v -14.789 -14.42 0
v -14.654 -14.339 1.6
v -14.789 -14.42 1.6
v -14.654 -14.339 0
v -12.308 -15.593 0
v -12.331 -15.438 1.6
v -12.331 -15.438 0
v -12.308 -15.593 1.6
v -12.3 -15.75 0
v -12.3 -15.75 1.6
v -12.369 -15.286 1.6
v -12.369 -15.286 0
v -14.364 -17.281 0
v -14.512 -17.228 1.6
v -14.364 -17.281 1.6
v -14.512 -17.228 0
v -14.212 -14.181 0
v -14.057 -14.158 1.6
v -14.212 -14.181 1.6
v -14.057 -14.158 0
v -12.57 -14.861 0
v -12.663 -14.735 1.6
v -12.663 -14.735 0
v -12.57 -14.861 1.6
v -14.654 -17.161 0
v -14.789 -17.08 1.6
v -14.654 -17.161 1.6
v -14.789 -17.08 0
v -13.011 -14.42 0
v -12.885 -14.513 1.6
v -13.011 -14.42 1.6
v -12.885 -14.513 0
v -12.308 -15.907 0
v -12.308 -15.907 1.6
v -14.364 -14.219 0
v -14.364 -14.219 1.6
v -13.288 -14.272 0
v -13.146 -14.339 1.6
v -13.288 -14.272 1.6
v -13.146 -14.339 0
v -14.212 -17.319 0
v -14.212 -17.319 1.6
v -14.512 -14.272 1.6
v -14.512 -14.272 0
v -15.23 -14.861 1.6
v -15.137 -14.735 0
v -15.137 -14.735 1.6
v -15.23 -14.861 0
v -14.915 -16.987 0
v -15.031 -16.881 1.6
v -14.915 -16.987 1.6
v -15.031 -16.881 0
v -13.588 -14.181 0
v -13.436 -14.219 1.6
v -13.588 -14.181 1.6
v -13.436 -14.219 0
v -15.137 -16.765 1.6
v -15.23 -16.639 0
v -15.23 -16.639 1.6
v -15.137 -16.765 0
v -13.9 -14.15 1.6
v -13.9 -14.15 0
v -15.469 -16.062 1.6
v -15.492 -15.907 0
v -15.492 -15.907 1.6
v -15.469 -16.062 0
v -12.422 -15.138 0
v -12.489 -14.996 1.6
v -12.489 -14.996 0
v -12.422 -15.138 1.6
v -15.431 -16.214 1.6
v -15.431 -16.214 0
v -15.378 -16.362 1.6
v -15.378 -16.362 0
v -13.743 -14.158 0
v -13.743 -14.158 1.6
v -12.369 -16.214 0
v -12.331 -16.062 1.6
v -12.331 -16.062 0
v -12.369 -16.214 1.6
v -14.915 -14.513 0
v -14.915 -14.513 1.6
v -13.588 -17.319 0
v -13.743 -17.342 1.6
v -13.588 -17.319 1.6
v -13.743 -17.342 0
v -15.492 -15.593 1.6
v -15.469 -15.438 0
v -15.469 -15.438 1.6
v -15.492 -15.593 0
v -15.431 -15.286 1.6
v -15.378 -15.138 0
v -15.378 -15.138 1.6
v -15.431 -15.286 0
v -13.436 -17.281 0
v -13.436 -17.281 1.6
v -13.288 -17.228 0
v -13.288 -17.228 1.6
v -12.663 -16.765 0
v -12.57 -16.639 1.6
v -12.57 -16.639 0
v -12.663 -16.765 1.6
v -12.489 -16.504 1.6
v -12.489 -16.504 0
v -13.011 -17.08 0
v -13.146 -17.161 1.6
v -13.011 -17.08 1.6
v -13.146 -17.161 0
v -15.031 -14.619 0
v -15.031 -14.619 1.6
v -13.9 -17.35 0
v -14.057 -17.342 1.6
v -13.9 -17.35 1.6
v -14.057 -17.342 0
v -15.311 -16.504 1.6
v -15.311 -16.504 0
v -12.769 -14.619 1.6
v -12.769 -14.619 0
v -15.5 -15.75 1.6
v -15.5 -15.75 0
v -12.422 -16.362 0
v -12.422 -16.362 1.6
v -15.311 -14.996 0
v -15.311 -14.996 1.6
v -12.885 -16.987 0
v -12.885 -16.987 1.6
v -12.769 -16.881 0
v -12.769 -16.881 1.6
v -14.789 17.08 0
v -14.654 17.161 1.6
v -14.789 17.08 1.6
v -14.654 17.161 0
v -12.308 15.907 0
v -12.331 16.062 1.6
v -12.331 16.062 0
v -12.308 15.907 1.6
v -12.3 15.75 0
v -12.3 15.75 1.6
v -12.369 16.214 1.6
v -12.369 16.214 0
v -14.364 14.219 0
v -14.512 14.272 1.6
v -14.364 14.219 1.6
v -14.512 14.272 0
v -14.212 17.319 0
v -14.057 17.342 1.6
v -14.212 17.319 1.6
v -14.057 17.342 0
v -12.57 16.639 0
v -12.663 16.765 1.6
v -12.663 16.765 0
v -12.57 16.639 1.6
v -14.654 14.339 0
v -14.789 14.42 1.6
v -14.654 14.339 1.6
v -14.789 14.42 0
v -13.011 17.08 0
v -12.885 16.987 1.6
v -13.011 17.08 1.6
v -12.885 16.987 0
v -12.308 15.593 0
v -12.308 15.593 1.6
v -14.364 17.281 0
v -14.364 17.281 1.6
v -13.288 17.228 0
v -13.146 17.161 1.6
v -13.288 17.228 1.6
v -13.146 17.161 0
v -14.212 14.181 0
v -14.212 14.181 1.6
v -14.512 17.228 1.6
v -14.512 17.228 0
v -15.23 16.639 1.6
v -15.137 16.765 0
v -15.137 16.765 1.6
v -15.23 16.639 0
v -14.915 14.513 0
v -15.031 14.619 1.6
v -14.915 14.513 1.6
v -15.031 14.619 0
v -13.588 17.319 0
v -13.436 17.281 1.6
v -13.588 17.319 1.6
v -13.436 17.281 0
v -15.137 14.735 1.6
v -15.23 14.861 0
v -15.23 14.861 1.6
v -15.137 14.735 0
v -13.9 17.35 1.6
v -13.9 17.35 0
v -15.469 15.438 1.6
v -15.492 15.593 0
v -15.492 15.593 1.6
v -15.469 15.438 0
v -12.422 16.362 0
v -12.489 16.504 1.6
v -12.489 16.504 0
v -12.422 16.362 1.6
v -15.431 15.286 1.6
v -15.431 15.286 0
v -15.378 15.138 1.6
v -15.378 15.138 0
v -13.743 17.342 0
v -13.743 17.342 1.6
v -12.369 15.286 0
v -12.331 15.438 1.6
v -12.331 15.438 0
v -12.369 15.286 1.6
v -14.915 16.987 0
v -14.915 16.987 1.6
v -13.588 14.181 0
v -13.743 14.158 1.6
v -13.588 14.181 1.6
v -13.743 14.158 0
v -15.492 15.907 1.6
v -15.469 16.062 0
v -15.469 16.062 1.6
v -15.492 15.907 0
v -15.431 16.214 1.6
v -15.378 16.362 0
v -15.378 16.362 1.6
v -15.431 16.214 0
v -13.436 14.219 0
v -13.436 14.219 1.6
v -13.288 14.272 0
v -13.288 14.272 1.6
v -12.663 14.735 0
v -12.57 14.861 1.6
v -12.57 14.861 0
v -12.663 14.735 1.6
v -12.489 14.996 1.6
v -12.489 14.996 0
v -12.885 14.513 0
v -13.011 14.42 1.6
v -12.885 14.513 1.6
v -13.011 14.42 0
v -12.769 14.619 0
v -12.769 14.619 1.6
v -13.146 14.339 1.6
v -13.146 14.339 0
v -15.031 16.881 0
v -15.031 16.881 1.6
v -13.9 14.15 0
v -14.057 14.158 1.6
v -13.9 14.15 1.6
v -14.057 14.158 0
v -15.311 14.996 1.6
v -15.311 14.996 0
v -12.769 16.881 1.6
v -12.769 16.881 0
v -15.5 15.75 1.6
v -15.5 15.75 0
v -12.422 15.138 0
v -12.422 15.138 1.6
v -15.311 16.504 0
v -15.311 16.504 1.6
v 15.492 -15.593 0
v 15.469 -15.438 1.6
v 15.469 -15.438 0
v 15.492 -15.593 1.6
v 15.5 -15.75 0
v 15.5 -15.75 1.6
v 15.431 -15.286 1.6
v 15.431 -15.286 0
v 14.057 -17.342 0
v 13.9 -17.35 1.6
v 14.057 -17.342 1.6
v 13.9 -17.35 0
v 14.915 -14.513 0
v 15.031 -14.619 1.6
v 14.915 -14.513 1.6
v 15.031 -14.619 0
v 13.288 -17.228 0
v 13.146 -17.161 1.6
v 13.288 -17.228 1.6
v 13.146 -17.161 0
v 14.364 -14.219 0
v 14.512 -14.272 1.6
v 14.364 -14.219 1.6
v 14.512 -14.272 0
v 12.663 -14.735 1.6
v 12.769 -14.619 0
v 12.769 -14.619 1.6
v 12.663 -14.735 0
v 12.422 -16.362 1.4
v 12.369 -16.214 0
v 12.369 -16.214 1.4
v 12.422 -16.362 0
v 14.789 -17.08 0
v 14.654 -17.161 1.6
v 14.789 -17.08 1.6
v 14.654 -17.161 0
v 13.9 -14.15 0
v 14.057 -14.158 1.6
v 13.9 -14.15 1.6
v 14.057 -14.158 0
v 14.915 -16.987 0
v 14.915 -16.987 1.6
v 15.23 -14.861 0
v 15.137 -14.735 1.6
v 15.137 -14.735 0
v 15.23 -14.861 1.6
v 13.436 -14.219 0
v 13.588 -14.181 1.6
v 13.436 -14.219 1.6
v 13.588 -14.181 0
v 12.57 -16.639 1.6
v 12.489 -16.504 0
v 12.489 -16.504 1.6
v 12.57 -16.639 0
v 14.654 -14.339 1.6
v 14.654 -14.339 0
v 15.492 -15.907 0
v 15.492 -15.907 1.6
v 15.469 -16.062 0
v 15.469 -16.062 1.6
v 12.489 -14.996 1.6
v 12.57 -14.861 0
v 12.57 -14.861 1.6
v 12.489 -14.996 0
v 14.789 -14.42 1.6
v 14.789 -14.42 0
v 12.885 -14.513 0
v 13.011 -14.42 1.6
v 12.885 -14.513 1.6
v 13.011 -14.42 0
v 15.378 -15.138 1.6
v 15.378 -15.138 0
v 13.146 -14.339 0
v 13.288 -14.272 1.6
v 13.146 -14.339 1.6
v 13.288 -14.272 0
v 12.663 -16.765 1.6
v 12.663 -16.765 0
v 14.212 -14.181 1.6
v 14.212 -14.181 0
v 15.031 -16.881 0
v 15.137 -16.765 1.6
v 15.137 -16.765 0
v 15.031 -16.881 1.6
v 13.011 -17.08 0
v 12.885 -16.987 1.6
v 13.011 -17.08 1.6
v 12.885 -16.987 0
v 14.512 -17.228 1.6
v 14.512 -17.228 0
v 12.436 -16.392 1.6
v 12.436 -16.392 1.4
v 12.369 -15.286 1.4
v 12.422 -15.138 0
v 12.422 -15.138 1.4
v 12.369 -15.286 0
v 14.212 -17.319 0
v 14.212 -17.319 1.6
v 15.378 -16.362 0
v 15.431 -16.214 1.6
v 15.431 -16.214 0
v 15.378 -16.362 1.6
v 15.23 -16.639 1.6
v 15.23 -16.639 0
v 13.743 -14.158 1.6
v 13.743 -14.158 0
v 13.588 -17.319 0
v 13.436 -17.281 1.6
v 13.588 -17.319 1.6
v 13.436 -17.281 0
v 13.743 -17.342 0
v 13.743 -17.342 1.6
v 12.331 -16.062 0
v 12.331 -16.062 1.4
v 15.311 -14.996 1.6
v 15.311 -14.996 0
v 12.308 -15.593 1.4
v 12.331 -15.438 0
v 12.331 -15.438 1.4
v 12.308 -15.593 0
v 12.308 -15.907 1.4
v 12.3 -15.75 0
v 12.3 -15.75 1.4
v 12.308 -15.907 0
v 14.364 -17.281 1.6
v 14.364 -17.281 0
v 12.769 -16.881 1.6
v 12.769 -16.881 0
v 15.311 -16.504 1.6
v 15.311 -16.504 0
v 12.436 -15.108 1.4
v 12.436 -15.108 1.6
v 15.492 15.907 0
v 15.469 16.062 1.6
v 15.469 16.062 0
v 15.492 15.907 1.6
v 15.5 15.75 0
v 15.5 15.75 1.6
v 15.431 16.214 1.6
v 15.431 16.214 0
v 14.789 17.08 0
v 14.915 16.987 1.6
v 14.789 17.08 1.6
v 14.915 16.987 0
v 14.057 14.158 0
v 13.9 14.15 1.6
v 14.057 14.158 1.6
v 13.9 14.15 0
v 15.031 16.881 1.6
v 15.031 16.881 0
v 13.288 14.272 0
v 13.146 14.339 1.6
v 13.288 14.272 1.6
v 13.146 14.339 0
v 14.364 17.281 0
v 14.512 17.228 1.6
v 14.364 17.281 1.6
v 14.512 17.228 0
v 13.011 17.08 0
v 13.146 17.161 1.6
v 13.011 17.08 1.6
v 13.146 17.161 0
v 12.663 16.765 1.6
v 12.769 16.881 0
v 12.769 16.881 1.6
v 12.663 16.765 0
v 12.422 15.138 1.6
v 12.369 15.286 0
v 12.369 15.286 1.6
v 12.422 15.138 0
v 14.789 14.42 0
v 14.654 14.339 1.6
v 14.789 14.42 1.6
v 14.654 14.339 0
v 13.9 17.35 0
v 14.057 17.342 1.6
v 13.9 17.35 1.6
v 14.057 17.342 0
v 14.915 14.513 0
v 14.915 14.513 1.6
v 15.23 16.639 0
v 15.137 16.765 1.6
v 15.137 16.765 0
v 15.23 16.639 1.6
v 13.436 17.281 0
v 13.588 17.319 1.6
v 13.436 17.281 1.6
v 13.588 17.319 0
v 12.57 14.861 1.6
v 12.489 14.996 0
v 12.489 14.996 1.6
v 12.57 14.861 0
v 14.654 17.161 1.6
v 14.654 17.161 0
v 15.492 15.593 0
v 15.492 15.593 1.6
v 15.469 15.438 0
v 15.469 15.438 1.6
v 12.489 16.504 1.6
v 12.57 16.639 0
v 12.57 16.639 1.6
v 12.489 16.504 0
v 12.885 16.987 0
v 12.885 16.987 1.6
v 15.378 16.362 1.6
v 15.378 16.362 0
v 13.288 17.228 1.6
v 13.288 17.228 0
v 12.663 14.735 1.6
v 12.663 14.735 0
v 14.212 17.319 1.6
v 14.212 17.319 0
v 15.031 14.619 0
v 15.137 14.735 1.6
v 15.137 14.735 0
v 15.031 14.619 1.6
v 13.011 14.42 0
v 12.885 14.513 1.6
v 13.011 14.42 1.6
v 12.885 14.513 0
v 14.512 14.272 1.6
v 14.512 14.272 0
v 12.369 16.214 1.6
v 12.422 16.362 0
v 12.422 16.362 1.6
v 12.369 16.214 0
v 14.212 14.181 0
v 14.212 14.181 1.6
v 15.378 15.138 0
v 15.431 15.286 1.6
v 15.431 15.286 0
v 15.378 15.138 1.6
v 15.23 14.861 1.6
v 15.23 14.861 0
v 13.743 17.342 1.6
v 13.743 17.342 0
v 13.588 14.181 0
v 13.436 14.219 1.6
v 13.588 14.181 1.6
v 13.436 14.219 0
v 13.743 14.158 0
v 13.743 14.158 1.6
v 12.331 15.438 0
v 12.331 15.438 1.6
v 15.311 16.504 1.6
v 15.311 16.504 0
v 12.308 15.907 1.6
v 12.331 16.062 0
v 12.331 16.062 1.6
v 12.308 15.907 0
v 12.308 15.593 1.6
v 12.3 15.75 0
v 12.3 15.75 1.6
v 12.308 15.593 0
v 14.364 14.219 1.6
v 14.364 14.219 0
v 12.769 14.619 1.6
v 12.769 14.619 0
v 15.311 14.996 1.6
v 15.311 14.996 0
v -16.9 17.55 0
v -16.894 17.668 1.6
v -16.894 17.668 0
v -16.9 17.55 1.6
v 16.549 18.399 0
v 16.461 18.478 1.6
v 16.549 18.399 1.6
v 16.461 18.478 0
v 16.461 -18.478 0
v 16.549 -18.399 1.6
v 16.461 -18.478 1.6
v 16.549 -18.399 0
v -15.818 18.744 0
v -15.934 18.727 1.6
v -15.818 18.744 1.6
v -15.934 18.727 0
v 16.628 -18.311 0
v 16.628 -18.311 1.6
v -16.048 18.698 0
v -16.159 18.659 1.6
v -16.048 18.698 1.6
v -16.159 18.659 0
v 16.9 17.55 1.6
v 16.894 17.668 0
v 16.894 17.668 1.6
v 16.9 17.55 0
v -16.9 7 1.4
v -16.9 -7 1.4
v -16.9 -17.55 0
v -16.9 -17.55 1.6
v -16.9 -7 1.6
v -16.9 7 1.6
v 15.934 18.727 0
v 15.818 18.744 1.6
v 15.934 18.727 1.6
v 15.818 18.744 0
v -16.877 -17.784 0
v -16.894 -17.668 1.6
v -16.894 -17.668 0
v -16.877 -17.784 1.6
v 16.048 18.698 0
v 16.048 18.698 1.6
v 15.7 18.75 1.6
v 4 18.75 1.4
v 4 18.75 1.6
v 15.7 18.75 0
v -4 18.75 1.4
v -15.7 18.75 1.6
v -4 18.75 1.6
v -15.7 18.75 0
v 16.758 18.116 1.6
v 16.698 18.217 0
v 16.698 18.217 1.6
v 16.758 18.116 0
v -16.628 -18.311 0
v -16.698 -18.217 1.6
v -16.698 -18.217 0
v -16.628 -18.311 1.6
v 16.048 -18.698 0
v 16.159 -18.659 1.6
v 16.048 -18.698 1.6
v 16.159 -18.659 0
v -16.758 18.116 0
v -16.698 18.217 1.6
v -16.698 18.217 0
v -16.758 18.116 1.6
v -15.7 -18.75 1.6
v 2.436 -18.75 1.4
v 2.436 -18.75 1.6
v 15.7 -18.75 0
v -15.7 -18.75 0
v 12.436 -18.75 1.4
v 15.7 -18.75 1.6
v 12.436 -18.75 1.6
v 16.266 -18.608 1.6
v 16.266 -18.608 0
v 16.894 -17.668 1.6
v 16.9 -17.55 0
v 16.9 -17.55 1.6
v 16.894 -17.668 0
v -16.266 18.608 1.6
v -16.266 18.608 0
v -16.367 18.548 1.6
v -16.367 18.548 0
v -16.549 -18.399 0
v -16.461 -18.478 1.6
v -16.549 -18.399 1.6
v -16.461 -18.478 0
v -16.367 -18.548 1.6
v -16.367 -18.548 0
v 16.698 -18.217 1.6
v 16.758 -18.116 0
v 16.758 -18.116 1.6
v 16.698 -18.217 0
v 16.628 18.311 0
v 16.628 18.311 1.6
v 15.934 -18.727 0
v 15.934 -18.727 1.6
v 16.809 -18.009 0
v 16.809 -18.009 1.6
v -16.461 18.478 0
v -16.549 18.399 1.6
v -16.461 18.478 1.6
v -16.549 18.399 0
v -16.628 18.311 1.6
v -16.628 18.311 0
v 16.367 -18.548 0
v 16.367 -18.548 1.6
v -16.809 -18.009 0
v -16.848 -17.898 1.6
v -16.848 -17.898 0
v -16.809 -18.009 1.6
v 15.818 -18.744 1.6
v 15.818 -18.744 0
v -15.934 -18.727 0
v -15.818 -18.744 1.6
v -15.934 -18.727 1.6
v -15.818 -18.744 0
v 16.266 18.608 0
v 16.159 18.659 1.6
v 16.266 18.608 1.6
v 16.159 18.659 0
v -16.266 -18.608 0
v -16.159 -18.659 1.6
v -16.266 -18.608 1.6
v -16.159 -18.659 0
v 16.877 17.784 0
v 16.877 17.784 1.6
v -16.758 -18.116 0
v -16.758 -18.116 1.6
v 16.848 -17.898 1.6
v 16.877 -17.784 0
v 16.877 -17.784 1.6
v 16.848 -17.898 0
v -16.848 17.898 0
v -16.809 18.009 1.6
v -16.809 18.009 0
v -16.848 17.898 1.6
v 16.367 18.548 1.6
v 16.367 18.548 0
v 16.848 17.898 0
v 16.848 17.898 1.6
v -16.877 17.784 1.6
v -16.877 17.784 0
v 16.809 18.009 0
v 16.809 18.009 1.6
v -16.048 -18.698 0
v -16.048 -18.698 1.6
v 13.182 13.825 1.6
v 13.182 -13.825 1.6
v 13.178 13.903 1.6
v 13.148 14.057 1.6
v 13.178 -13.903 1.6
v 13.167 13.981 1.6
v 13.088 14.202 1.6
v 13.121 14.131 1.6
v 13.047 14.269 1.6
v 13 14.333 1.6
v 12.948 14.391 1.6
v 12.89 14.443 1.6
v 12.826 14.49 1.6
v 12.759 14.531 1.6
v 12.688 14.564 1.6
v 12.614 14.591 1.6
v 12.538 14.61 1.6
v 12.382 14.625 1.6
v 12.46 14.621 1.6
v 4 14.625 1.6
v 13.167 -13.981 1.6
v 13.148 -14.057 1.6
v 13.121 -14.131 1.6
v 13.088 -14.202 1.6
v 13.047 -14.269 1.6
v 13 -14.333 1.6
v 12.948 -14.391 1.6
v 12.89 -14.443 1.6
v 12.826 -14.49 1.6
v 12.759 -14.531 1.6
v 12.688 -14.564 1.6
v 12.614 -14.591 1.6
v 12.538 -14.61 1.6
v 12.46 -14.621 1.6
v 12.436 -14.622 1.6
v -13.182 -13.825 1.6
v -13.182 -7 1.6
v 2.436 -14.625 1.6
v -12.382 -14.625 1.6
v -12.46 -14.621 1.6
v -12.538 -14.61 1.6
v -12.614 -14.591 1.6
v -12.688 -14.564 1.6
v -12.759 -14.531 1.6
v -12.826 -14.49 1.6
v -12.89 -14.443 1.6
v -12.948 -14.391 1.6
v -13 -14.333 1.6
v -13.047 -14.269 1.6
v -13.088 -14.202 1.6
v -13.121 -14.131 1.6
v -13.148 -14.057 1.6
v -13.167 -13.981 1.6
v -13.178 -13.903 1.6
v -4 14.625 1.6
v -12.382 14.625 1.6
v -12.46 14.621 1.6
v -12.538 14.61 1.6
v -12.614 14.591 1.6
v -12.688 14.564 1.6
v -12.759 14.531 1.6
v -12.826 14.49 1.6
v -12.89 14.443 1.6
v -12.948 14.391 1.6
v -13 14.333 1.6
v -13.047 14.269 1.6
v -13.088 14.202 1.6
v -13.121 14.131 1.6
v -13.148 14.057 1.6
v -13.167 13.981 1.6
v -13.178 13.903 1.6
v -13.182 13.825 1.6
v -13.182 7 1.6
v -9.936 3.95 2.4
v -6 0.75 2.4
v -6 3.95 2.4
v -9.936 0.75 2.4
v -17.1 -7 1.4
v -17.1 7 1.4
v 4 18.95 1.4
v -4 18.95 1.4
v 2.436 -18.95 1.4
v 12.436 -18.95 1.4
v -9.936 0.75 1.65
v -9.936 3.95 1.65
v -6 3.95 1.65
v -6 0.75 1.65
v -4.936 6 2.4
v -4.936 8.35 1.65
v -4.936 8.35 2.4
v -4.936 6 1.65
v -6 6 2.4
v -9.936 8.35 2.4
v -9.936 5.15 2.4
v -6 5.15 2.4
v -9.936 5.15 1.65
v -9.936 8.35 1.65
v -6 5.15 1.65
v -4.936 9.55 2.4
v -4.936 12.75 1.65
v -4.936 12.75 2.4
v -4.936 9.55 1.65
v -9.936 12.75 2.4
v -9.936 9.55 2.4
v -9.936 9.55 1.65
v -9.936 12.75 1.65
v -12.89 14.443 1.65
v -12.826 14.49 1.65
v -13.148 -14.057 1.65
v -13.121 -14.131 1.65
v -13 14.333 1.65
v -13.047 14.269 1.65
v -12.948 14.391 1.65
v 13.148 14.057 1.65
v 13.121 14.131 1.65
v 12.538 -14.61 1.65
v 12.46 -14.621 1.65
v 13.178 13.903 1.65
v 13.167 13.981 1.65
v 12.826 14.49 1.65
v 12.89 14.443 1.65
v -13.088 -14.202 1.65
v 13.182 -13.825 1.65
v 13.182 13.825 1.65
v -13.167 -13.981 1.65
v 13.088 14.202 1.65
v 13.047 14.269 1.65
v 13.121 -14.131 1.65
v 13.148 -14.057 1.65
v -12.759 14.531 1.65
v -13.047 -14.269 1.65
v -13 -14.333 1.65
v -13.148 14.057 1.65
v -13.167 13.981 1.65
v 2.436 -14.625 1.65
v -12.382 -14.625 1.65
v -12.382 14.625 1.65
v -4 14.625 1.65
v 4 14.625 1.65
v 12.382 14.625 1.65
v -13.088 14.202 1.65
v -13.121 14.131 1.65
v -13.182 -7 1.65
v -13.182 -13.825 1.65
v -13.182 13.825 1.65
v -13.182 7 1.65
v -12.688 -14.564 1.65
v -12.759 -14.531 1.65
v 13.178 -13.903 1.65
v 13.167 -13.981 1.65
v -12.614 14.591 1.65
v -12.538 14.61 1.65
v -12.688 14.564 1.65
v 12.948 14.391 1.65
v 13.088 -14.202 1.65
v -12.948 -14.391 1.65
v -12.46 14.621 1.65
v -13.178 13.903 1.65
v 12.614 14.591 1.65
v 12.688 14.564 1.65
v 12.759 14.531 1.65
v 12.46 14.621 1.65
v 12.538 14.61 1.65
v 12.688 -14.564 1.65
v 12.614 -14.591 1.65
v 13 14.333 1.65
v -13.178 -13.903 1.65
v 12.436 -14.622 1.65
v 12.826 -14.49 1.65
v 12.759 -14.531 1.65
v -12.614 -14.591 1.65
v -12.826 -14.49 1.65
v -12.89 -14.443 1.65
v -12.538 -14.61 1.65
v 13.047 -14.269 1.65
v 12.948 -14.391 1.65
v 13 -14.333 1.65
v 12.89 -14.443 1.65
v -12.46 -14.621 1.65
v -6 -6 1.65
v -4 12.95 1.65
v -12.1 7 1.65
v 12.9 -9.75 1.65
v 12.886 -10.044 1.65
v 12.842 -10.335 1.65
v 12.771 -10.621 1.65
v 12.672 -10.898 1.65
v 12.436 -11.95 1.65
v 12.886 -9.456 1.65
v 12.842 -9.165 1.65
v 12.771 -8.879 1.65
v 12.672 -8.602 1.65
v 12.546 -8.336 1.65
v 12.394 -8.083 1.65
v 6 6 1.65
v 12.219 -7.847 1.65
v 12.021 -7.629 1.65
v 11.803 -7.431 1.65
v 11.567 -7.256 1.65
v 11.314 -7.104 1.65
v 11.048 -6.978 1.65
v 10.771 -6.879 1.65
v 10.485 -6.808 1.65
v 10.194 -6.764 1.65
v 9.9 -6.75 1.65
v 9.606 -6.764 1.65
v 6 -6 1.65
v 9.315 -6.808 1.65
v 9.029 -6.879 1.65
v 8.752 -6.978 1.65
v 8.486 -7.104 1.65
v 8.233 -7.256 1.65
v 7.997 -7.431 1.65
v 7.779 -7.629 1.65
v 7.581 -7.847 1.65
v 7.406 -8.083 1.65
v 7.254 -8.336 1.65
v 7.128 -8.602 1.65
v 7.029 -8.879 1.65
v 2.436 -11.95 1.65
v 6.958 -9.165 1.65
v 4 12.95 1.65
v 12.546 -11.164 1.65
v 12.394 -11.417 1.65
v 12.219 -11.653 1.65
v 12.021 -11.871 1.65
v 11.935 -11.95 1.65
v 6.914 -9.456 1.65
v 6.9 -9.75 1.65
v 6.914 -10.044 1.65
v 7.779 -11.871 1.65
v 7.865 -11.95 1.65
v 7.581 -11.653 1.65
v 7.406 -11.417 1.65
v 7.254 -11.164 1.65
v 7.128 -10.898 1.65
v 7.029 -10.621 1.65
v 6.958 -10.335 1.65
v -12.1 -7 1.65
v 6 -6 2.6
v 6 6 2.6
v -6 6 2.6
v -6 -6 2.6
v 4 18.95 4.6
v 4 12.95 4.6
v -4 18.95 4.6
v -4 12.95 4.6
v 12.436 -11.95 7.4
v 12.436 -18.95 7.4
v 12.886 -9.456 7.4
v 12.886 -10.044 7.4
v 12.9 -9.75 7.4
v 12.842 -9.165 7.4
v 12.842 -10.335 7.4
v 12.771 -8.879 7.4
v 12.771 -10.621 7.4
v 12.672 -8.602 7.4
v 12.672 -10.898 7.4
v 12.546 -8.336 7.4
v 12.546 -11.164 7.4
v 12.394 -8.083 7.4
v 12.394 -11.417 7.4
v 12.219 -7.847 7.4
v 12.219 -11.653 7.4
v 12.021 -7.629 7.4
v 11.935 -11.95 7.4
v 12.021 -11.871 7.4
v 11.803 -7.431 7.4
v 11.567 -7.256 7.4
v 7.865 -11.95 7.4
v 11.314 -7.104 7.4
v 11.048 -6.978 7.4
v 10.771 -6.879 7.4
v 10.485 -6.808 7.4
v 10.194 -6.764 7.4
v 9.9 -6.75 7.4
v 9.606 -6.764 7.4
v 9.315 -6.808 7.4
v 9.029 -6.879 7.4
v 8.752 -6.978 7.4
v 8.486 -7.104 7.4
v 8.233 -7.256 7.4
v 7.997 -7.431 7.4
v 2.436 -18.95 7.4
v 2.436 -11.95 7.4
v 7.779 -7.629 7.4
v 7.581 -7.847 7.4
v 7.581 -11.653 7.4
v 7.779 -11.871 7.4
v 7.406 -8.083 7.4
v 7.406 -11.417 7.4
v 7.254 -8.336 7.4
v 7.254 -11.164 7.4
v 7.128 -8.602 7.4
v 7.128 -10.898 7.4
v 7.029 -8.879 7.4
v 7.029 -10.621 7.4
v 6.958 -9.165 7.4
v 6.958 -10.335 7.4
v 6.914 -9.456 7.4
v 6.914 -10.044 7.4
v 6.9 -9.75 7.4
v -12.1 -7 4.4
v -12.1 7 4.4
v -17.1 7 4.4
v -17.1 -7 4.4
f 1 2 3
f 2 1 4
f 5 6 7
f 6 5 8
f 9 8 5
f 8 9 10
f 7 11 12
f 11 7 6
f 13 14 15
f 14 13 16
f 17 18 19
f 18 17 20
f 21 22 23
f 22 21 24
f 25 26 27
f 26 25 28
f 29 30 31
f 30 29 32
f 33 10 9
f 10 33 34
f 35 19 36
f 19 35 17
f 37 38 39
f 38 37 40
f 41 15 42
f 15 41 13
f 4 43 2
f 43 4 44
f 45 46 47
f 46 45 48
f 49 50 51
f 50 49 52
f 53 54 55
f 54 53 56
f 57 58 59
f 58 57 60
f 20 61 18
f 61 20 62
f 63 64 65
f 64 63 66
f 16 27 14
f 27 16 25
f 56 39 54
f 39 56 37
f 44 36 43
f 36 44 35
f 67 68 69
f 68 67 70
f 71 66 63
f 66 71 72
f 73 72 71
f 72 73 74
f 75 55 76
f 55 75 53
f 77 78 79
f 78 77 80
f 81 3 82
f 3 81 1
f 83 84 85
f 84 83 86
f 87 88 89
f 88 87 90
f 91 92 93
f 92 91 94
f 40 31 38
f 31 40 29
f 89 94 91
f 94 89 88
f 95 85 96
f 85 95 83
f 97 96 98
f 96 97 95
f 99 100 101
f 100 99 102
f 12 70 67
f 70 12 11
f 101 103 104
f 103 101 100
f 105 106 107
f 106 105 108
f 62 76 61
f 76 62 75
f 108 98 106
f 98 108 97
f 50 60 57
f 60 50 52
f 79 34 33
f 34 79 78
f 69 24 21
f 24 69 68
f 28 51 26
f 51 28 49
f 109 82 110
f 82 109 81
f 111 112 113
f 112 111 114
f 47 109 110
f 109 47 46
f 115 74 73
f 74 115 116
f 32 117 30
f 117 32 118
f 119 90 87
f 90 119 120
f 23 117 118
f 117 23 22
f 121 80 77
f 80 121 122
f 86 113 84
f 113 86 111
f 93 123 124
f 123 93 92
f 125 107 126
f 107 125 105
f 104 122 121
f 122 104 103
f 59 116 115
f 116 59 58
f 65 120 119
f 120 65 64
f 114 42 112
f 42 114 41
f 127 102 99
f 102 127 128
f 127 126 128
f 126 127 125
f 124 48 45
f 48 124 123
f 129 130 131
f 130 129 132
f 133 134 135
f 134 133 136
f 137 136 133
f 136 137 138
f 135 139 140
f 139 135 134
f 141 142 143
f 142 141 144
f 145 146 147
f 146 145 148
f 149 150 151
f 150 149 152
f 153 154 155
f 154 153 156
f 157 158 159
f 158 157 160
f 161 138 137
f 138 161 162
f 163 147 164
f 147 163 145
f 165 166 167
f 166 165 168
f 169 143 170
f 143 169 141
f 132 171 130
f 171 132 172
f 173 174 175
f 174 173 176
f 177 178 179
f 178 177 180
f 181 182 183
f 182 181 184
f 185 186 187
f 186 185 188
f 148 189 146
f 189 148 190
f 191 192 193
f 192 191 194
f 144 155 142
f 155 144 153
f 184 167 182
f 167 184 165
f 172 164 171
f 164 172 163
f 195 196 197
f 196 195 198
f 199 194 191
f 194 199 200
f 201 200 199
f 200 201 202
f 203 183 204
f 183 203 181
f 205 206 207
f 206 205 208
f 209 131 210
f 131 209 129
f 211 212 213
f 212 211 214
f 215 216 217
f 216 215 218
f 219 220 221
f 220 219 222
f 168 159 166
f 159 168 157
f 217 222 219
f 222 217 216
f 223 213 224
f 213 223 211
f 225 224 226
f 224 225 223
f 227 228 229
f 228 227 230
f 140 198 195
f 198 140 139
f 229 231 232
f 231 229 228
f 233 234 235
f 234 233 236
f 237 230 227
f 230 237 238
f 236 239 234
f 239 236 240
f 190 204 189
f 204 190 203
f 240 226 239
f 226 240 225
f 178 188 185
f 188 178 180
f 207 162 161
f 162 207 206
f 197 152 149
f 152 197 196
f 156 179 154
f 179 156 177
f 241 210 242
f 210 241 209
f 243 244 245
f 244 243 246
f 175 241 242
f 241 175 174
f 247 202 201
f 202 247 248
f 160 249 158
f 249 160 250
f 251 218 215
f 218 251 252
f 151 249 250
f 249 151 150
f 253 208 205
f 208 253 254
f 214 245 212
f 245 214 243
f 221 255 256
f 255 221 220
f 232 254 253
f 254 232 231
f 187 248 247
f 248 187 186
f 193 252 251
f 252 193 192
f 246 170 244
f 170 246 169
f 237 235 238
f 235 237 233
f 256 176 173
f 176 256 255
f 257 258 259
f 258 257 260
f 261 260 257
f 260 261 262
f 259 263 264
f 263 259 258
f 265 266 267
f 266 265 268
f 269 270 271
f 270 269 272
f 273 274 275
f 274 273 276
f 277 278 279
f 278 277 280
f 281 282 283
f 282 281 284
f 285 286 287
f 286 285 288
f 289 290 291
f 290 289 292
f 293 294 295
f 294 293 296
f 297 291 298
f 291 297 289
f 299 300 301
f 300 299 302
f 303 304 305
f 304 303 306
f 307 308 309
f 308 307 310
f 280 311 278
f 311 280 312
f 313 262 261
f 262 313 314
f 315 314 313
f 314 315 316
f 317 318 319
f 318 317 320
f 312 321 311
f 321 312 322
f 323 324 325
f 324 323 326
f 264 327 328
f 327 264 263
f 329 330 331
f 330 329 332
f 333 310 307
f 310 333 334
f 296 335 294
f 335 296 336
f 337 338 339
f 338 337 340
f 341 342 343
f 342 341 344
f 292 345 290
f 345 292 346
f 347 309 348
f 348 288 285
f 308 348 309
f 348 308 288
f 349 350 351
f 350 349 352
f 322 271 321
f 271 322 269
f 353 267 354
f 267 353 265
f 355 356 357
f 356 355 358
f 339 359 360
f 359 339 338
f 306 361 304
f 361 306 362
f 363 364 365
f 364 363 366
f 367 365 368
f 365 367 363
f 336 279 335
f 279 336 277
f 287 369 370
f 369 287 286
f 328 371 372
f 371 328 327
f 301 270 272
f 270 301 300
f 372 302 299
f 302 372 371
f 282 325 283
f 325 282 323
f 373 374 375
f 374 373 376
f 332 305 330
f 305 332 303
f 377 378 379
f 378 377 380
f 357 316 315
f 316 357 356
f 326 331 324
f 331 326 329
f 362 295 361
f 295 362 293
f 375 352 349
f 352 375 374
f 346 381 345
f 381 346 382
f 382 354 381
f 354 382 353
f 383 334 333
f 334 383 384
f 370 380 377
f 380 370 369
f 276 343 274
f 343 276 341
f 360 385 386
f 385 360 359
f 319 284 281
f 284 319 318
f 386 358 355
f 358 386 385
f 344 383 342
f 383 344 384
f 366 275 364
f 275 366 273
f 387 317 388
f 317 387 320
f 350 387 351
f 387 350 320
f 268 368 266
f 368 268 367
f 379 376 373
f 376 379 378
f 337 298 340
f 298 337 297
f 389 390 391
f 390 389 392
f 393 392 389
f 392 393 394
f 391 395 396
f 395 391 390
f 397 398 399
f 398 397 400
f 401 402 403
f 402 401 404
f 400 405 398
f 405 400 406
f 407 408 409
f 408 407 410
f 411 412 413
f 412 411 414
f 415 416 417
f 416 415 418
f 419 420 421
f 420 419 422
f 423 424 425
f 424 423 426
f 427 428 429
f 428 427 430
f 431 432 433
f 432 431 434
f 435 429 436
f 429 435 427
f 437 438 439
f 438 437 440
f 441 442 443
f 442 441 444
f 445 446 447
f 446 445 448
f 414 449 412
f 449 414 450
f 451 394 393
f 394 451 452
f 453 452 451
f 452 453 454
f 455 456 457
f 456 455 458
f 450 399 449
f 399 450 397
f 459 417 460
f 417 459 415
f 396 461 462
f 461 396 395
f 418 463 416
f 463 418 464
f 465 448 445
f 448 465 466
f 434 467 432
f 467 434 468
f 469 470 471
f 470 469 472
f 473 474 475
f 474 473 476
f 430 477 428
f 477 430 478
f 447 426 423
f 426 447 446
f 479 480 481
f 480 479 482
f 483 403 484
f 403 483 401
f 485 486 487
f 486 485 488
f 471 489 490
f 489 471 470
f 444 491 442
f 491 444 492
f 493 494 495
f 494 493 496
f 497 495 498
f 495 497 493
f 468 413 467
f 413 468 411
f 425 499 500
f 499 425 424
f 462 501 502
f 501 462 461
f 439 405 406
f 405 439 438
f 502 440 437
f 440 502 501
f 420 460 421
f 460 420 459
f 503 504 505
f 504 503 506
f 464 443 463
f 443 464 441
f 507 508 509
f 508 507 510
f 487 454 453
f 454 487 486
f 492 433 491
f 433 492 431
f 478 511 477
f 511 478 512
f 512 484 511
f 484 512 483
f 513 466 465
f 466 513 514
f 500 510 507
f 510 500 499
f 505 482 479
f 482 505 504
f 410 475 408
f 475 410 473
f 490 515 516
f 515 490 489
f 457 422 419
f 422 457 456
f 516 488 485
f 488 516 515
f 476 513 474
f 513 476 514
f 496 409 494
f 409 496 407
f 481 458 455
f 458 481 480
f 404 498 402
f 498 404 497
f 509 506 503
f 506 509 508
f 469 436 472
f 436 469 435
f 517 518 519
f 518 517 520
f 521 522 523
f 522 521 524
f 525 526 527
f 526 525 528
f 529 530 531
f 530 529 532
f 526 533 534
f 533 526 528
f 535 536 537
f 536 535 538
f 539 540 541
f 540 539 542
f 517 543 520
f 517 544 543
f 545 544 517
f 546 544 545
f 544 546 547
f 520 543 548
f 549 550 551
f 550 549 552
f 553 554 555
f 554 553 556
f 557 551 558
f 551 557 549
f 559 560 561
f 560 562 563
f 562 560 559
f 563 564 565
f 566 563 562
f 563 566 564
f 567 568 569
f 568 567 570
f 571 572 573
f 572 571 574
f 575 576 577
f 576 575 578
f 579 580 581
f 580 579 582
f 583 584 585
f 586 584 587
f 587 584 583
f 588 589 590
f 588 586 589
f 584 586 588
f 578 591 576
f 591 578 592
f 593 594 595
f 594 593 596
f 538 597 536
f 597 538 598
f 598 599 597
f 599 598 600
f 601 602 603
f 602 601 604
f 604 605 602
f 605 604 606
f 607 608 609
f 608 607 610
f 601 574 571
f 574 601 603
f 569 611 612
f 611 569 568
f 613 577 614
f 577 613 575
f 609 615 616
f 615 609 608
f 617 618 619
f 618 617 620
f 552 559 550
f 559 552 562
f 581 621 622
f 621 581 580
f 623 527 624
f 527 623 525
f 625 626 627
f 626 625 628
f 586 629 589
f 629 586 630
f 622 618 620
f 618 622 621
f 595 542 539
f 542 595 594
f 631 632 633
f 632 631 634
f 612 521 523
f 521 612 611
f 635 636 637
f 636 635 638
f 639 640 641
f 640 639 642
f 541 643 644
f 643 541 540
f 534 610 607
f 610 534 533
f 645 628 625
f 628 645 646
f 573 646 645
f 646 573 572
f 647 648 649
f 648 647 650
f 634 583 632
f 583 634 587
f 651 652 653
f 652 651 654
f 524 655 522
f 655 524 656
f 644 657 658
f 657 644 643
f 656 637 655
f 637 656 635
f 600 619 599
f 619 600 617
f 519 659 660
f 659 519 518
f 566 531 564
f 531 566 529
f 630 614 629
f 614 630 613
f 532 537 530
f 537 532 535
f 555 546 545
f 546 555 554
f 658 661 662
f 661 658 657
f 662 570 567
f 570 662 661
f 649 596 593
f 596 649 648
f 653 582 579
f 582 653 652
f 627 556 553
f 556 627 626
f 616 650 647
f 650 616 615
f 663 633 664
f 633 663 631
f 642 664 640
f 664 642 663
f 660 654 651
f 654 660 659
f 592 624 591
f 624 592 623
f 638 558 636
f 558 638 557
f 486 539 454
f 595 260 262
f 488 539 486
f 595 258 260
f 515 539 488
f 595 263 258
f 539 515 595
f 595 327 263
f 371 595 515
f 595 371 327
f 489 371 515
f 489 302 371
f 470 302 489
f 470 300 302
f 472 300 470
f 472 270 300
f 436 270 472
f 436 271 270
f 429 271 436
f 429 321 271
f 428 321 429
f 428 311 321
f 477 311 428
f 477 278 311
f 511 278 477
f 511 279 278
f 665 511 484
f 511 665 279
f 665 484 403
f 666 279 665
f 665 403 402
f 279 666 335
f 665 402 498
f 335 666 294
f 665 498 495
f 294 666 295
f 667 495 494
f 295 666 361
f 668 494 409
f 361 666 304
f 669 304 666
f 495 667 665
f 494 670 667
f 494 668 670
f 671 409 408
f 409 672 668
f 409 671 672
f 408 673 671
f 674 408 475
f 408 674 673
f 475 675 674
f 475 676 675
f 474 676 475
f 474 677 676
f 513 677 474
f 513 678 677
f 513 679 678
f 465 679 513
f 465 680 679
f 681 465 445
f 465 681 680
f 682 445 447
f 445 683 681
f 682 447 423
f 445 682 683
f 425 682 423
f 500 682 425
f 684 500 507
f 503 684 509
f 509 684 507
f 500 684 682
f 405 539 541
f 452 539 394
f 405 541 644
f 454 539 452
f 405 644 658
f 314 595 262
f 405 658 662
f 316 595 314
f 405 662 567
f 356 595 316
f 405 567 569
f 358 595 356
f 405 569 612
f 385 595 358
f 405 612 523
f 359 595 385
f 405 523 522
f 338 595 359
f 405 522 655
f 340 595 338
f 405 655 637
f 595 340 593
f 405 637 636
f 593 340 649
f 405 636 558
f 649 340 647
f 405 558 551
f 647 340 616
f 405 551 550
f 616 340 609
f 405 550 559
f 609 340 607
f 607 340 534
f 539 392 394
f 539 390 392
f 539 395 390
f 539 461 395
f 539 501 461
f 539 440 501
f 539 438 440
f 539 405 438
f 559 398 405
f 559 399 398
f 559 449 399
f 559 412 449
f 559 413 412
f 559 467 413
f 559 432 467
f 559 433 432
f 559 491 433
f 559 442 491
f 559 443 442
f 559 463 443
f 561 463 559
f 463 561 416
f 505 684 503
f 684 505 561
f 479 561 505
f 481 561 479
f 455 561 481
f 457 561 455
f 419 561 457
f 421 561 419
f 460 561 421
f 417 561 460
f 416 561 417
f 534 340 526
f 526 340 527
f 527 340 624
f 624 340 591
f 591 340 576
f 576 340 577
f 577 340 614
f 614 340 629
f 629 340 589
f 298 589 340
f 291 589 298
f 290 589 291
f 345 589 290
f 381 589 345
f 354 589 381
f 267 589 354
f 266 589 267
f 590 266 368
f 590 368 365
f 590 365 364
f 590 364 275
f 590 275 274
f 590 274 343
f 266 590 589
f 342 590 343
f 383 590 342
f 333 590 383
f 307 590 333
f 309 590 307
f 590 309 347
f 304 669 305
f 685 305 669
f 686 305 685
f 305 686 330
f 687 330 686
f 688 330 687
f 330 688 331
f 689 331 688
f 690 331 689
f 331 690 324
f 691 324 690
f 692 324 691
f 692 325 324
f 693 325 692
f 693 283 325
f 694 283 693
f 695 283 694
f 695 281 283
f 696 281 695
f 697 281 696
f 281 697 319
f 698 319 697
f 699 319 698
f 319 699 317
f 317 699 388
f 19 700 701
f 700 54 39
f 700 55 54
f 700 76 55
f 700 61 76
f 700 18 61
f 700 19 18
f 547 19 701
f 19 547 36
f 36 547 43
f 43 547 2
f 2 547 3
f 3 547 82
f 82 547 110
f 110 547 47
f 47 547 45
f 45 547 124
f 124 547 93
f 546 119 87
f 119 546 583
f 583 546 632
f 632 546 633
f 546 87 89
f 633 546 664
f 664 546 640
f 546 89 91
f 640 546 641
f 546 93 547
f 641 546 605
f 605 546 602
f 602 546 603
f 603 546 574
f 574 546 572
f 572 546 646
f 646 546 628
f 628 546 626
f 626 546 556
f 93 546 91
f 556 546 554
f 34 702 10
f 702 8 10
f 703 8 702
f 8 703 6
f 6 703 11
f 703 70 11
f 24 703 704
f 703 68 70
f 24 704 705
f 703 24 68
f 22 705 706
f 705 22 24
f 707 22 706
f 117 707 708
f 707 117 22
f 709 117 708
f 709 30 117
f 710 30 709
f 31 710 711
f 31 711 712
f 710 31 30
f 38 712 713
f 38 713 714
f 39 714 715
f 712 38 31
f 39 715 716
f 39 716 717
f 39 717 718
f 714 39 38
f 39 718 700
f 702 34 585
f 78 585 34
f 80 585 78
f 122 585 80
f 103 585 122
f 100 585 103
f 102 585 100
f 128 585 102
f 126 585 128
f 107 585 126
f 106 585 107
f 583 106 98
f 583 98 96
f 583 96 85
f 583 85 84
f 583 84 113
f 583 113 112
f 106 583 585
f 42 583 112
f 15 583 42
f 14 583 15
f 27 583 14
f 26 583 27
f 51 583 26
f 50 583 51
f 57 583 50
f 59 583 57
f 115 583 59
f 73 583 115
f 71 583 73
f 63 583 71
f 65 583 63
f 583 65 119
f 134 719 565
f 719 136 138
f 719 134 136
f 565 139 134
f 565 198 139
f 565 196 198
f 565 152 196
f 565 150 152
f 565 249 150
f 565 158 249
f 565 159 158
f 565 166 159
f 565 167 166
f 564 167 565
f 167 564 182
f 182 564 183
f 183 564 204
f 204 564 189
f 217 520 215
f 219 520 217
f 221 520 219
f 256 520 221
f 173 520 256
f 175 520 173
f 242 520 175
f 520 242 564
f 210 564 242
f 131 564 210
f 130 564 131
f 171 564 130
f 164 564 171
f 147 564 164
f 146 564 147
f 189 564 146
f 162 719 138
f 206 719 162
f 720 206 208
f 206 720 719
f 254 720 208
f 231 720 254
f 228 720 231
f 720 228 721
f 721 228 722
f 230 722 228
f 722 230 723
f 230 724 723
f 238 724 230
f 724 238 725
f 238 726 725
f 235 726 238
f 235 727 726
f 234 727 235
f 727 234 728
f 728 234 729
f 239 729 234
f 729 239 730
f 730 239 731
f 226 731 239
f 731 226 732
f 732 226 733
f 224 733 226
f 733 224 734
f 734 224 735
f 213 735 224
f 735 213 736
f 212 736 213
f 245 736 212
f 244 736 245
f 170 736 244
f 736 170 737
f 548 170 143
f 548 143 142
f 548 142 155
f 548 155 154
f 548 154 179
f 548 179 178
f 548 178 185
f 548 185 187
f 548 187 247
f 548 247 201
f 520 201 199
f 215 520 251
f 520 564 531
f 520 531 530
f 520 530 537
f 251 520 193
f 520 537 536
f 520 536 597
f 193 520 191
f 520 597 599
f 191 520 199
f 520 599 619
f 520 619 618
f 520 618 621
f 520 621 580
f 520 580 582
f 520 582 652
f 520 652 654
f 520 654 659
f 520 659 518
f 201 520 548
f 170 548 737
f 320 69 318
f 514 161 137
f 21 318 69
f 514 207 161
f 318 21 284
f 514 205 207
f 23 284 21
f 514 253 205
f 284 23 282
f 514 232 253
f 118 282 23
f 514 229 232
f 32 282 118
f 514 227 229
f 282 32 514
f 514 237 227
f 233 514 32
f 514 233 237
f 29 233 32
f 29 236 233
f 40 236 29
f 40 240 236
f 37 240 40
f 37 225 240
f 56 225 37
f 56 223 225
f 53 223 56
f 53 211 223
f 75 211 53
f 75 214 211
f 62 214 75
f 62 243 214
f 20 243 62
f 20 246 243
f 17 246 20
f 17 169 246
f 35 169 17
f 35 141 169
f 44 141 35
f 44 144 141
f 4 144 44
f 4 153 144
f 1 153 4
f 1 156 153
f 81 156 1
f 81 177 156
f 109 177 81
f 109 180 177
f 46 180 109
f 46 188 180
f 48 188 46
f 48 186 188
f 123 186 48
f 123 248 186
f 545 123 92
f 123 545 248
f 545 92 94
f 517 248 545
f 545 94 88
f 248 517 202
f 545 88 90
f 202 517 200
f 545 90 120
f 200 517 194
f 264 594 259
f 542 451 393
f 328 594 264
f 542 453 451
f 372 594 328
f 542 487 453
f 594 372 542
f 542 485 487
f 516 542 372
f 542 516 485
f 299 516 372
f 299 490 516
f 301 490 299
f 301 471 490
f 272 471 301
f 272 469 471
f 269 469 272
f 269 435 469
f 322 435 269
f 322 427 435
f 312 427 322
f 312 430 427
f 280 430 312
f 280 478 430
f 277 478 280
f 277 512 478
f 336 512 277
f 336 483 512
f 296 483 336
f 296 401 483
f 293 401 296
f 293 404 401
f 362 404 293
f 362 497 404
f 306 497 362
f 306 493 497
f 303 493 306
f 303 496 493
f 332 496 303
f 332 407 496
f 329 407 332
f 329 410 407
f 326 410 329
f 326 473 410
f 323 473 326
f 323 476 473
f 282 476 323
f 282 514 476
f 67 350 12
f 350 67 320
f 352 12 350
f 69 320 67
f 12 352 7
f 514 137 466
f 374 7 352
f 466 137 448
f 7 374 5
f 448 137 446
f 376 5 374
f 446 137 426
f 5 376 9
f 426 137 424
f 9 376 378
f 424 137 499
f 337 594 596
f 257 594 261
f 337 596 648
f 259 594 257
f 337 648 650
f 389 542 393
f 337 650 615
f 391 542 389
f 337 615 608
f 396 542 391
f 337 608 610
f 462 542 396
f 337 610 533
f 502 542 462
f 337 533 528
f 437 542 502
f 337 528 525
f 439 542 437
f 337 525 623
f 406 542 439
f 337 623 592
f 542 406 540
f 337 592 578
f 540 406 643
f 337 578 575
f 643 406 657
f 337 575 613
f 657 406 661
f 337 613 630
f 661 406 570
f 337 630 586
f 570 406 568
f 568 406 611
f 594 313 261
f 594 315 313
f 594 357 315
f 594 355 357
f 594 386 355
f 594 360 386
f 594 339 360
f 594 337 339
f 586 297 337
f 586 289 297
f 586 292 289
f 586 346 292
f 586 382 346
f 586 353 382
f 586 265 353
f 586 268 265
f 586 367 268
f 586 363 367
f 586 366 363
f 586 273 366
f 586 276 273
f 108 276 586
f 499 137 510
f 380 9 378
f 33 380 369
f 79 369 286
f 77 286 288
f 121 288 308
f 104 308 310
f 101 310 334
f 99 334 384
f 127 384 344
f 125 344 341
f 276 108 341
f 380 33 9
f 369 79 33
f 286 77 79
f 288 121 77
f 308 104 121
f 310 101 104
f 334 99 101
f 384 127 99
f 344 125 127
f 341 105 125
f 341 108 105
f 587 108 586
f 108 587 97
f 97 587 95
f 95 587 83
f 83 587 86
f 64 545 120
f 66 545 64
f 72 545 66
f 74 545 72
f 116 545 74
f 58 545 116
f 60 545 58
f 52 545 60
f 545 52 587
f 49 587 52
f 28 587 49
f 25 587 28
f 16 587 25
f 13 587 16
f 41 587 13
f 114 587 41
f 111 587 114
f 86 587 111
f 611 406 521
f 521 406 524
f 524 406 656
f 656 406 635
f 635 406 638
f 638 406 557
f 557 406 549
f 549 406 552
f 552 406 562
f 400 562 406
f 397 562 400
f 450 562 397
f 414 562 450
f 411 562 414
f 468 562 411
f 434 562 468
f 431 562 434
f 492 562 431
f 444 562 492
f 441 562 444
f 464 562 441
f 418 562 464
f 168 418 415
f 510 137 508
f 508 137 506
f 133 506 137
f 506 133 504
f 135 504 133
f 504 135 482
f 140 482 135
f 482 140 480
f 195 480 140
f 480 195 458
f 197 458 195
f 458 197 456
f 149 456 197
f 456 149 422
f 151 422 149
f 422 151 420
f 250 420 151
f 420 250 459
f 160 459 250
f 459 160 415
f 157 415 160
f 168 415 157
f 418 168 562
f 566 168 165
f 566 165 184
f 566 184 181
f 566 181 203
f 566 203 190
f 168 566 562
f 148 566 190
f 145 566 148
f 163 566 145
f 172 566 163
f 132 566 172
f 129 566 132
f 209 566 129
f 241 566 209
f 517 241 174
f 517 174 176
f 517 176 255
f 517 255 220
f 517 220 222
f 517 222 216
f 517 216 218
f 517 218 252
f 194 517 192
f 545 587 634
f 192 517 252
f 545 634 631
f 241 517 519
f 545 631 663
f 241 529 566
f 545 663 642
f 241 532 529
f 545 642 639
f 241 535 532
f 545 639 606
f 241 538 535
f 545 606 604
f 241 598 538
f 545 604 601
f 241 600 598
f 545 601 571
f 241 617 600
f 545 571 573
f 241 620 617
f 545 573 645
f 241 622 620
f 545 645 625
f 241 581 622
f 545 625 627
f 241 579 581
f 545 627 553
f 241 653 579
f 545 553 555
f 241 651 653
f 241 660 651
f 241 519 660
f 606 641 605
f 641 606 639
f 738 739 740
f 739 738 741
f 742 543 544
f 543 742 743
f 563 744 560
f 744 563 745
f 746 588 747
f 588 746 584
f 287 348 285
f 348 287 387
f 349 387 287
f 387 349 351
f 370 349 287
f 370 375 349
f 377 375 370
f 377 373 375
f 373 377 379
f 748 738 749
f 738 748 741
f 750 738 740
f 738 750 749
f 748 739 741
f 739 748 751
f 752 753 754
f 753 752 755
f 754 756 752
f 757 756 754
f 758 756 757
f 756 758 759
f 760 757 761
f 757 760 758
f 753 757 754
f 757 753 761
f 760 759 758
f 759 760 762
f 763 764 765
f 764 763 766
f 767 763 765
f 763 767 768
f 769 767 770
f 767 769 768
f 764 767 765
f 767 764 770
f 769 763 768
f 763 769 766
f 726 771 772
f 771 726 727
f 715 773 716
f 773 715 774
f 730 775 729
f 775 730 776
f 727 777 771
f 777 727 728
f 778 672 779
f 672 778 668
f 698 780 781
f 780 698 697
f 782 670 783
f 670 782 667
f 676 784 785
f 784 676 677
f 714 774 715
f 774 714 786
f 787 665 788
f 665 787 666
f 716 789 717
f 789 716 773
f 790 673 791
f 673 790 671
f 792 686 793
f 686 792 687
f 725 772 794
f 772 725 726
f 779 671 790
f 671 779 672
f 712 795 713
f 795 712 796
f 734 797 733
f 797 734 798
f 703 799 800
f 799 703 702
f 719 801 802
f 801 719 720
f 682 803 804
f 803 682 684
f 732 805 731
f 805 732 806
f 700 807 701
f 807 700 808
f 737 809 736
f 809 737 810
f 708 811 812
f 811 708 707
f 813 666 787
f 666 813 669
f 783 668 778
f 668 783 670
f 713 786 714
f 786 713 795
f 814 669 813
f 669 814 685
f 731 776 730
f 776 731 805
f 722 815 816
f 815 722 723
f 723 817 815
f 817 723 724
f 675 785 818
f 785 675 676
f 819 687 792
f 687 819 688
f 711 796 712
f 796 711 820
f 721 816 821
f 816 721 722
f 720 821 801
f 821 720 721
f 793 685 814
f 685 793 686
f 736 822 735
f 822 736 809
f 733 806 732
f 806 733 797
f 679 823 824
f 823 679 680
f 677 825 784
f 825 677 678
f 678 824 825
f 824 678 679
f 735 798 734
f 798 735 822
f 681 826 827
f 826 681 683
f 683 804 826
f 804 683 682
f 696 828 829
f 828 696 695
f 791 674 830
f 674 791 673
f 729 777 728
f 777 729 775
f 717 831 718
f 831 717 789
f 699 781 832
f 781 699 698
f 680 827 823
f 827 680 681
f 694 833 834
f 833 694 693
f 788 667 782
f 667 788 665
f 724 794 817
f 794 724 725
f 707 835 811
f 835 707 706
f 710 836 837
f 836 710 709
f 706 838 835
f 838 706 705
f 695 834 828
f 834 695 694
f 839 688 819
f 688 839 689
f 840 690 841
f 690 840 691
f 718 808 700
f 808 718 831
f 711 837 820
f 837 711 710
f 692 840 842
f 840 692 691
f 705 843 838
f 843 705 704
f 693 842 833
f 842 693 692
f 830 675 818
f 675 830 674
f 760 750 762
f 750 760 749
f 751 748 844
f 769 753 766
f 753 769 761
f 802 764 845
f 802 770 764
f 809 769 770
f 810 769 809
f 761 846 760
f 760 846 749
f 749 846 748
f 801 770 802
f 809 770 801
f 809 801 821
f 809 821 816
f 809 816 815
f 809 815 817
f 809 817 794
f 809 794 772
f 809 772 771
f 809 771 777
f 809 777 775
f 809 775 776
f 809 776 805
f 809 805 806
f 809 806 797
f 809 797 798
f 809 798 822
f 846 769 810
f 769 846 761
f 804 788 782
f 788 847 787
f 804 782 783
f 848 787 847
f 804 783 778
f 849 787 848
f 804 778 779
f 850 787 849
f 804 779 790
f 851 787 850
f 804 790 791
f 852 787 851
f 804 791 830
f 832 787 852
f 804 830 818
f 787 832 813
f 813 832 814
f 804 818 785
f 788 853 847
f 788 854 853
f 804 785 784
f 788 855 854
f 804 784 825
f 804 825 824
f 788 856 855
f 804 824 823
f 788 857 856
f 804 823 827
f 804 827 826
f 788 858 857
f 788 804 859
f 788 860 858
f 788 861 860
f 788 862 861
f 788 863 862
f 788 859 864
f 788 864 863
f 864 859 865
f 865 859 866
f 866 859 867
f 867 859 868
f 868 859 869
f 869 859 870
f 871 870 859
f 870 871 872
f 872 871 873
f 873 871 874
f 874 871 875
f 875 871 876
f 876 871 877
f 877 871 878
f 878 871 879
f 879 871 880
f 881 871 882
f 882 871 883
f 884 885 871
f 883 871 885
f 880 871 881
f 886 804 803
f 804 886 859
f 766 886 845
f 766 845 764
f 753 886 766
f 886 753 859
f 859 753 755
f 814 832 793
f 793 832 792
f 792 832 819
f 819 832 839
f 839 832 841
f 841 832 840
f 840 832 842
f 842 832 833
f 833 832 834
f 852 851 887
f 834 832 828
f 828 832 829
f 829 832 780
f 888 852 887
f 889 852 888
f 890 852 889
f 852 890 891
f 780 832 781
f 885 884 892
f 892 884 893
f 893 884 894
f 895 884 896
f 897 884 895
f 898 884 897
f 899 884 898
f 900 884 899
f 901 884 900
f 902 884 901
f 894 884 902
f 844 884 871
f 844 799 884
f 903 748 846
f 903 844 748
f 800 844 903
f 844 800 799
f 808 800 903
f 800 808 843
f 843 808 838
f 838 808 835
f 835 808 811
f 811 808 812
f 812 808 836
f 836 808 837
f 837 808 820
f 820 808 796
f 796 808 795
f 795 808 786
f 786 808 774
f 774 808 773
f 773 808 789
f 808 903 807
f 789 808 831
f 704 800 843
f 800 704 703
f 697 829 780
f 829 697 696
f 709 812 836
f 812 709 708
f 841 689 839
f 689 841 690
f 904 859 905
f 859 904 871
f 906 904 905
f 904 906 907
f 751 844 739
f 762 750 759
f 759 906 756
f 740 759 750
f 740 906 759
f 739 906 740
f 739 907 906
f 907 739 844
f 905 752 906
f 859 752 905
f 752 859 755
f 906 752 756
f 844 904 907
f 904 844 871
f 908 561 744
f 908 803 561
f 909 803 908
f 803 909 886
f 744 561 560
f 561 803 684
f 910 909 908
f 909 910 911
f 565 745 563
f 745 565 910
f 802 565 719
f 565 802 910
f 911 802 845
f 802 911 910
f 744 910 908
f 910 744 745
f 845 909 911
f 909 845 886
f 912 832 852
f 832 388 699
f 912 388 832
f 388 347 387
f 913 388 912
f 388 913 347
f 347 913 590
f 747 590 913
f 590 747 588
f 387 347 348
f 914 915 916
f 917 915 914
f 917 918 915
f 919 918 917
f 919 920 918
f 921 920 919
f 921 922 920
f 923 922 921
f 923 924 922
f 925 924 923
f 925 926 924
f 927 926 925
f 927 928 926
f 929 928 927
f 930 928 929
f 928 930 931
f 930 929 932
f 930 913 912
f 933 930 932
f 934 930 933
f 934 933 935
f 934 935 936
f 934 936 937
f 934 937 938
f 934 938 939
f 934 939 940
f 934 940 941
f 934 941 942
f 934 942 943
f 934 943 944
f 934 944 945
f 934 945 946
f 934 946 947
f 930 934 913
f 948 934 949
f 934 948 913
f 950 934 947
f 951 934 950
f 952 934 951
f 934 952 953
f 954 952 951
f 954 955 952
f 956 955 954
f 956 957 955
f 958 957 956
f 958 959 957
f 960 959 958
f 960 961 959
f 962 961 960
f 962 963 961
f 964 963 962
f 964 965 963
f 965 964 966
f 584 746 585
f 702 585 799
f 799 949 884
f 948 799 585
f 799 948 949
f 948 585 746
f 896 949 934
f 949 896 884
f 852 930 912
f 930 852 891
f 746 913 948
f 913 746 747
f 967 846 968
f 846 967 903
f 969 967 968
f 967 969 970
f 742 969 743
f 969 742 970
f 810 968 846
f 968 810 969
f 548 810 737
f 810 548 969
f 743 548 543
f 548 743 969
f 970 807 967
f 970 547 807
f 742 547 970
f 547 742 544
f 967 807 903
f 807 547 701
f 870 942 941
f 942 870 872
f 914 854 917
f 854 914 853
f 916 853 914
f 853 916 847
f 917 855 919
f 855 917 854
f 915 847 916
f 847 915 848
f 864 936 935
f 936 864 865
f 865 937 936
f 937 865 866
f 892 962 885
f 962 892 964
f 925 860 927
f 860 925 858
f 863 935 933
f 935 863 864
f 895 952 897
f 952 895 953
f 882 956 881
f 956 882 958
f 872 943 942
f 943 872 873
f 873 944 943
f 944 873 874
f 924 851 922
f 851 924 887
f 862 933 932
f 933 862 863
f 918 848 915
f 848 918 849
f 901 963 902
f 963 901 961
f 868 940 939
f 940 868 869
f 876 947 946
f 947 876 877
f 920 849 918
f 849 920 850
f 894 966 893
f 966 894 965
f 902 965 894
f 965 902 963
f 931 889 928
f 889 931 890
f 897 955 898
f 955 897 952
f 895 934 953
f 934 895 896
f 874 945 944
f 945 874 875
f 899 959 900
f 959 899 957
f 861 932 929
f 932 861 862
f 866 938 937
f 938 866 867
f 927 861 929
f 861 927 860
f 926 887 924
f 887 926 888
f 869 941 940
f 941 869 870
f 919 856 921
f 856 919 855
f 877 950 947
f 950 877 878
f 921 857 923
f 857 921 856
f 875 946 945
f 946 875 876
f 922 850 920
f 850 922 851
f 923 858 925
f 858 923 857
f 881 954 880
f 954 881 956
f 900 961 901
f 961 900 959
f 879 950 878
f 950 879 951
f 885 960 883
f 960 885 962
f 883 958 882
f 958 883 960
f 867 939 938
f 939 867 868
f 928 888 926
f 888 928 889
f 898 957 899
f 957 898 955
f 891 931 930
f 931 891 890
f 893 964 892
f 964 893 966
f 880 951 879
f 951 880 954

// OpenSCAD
$fn = 64;

// Control board overall size (verified by parameters)
board_x  = 33.8;
board_y  = 37.5;
board_th = 1.6;

// Small overlap to guarantee watertight unions
eps = 0.2;

// ---------- Feature parameters (generic control-board look) ----------
corner_r = 1.2;

// Mounting holes (typical 3mm clearance) and offsets from edges
hole_d = 3.2;
hole_edge_x = 3.0;
hole_edge_y = 3.0;

// Components (kept within board outline and connected)
soldermask_bump = 0.25;   // subtle raised "silkscreen/soldermask" areas
ic_h   = 1.2;
ic_x   = 12.0;
ic_y   = 12.0;

usb_w  = 8.0;
usb_d  = 6.0;
usb_h  = 3.2;

term_w = 10.0;
term_d = 7.0;
term_h = 6.0;

pin_w  = 14.0;
pin_d  = 5.0;
pin_h  = 3.0;

cap_r  = 3.0;
cap_h  = 6.0;

// ---------- Helpers ----------
module rounded_rect_prism(x, y, z, r) {
    // Rounded rectangle via hull of corner cylinders
    hull() {
        for (sx = [-1, 1], sy = [-1, 1])
            translate([sx*(x/2 - r), sy*(y/2 - r), 0])
                cylinder(r=r, h=z, center=true);
    }
}

module mount_holes() {
    for (sx = [-1, 1], sy = [-1, 1])
        translate([sx*(board_x/2 - hole_edge_x), sy*(board_y/2 - hole_edge_y), 0])
            cylinder(d=hole_d, h=board_th + 2, center=true);
}

// ---------- Model (ONE connected solid) ----------
union() {
    // PCB with mounting holes
    color([0.05, 0.45, 0.12])
    difference() {
        translate([0, 0, board_th/2])
            rounded_rect_prism(board_x, board_y, board_th, corner_r);
        translate([0, 0, board_th/2])
            mount_holes();
    }

    // Subtle raised regions on top (kept connected by overlapping into PCB)
    color([0.08, 0.55, 0.18])
    translate([0, 0, board_th + soldermask_bump/2 - eps])
        rounded_rect_prism(board_x*0.78, board_y*0.78, soldermask_bump, 0.8);

    // Main IC (center)
    color([0.15, 0.15, 0.15])
    translate([0, 0, board_th + ic_h/2 - eps])
        cube([ic_x, ic_y, ic_h], center=true);

    // USB-like connector on +Y edge (centered)
    color([0.75, 0.75, 0.75])
    translate([0,
               board_y/2 - usb_d/2 + eps,
               board_th + usb_h/2 - eps])
        cube([usb_w, usb_d, usb_h], center=true);

    // Screw terminal on -Y edge (offset to +X)
    color([0.1, 0.35, 0.75])
    translate([board_x*0.22,
               -board_y/2 + term_d/2 - eps,
               board_th + term_h/2 - eps])
        cube([term_w, term_d, term_h], center=true);

    // Pin header on -X edge (centered in Y)
    color([0.2, 0.2, 0.2])
    translate([-board_x/2 + pin_d/2 - eps,
               0,
               board_th + pin_h/2 - eps])
        cube([pin_d, pin_w, pin_h], center=true);

    // Electrolytic capacitor (near +X, -Y quadrant)
    color([0.05, 0.05, 0.05])
    translate([board_x/2 - (cap_r + 4.0),
               -board_y/2 + (cap_r + 6.0),
               board_th + cap_h/2 - eps])
        cylinder(r=cap_r, h=cap_h, center=true);

    // Small "chips" cluster (top-left area)
    color([0.12, 0.12, 0.12])
    for (i = [0:2]) {
        chip_x = 5.0;
        chip_y = 3.2;
        chip_h = 1.0;
        gap = 1.2;
        translate([-board_x*0.22,
                   board_y*0.18 + i*(chip_y + gap) - (chip_y + gap),
                   board_th + chip_h/2 - eps])
            cube([chip_x, chip_y, chip_h], center=true);
    }
}
